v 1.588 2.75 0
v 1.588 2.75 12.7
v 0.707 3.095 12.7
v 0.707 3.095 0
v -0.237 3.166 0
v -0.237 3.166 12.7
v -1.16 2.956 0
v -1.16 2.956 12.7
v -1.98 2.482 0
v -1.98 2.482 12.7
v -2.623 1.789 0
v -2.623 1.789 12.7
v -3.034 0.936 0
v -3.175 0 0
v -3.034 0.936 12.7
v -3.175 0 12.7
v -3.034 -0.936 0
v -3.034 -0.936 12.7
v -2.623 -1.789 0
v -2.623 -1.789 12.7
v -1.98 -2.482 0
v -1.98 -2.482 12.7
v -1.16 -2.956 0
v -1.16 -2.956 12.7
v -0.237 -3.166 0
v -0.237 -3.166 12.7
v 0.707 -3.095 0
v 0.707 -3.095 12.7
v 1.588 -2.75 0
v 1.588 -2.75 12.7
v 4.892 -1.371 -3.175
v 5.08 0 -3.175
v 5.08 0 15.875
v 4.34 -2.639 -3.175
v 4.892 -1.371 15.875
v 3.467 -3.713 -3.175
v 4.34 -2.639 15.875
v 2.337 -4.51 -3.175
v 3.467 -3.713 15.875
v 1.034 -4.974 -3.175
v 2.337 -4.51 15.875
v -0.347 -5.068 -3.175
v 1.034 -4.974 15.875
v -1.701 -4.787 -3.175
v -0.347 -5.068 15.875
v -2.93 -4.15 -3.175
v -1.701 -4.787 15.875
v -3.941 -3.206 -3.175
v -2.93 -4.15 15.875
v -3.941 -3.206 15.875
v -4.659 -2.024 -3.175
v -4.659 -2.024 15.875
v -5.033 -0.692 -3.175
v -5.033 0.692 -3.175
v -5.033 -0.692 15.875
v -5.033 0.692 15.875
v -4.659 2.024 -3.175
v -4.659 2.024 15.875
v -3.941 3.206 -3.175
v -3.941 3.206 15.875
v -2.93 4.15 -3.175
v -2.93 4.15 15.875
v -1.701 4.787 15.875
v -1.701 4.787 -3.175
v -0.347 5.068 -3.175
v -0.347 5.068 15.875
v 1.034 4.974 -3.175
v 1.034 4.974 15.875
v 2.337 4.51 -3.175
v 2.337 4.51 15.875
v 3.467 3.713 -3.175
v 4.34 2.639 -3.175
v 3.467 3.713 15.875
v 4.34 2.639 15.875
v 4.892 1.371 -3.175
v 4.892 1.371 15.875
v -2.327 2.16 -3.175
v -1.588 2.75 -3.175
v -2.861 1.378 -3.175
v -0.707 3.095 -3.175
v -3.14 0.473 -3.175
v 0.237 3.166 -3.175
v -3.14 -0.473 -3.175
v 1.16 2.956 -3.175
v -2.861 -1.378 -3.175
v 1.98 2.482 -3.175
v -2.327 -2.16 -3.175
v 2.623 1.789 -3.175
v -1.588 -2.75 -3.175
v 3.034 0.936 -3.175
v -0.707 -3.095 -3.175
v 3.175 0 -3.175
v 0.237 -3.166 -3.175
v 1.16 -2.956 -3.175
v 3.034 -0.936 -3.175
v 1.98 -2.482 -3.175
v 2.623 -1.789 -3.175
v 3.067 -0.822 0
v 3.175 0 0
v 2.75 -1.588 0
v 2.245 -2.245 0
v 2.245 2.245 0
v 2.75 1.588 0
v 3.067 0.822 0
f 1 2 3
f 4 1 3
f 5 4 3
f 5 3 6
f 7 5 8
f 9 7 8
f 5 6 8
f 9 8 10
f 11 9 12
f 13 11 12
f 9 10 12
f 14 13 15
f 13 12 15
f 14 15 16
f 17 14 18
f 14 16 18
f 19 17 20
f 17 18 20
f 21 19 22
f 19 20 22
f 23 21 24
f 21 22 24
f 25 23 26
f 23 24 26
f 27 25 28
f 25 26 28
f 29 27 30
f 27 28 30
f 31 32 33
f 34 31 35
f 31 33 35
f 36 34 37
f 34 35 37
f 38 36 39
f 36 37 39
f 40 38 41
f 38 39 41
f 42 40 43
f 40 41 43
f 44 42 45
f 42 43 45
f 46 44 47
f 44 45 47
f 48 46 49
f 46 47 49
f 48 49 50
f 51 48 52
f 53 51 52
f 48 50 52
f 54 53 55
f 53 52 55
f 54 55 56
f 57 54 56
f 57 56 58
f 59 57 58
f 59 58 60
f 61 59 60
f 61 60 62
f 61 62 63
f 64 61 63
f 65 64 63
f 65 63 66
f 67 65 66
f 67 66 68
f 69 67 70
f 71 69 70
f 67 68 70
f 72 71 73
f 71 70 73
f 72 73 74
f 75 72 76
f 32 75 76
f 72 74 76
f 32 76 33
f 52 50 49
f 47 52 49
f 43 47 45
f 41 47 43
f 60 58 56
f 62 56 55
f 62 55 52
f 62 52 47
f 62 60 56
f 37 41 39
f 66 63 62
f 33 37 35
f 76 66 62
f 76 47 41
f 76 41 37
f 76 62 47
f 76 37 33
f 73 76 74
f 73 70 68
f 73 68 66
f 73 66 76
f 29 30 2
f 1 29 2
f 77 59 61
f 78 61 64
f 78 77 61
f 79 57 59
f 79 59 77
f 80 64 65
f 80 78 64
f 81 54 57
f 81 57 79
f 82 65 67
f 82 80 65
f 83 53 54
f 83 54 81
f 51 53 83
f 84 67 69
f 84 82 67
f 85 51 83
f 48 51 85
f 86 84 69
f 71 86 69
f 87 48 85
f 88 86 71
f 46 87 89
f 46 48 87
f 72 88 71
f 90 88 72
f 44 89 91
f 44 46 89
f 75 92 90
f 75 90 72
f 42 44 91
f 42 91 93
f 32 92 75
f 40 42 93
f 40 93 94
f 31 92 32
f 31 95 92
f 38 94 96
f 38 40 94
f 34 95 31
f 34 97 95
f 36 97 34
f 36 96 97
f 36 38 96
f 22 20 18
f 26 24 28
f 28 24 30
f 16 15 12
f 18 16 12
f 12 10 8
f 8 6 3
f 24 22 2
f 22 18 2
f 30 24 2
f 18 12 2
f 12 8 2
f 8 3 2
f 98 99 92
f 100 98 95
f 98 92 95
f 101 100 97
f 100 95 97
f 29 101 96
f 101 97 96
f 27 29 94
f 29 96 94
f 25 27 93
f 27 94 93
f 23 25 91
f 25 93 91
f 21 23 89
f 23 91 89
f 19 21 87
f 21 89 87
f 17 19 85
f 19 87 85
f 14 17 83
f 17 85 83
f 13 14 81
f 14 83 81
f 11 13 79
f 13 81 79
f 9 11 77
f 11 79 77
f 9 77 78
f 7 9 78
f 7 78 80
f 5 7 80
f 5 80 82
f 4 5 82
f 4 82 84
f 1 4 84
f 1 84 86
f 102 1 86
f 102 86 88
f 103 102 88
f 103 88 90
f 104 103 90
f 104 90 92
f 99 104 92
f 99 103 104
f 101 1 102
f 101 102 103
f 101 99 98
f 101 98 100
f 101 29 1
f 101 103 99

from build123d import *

# Parameters (mm, degrees)
F0_R     = 5.08
F1_DEPTH = 12.7
F3_DEPTH = 25.4
F4_R     = 5.08
F5_DEPTH = 3.175
F6_R     = 5.08
F7_DEPTH = 3.175
F8_R     = 3.175
F9_DEPTH = 3.175


with BuildPart() as f1:
    # F0 (on Top) → F1 (new body)
    with BuildSketch(Plane.XY):
        Circle(F0_R)
    extrude(amount=F1_DEPTH)

    # F2 (on face) → F3 (cut)
    with BuildSketch(Plane.XY.offset(12.7)):
        with BuildLine():
            Line((1.5875, -2.749631), (1.5875, 2.749631))
            ThreePointArc((1.5875, 2.749631), (-3.175, 0), (1.5875, -2.749631))
        make_face()
    extrude(amount=-F3_DEPTH, mode=Mode.SUBTRACT)

    # F4 (on face) → F5 (join)
    with BuildSketch(Plane.XY.offset(12.7)):
        Circle(F4_R)
    extrude(amount=F5_DEPTH)

    # F6 (on face) → F7 (join)
    with BuildSketch(Plane(origin=(0, 0, 0), x_dir=(1, 0, 0), z_dir=(0, 0, -1))):
        Circle(F6_R)
    extrude(amount=F7_DEPTH)

    # F8 (on face) → F9 (cut)
    with BuildSketch(Plane(origin=(0, 0, -3.175), x_dir=(1, 0, 0), z_dir=(0, 0, -1))):
        Circle(F8_R)
    extrude(amount=-F9_DEPTH, mode=Mode.SUBTRACT)


solid = f1.part
